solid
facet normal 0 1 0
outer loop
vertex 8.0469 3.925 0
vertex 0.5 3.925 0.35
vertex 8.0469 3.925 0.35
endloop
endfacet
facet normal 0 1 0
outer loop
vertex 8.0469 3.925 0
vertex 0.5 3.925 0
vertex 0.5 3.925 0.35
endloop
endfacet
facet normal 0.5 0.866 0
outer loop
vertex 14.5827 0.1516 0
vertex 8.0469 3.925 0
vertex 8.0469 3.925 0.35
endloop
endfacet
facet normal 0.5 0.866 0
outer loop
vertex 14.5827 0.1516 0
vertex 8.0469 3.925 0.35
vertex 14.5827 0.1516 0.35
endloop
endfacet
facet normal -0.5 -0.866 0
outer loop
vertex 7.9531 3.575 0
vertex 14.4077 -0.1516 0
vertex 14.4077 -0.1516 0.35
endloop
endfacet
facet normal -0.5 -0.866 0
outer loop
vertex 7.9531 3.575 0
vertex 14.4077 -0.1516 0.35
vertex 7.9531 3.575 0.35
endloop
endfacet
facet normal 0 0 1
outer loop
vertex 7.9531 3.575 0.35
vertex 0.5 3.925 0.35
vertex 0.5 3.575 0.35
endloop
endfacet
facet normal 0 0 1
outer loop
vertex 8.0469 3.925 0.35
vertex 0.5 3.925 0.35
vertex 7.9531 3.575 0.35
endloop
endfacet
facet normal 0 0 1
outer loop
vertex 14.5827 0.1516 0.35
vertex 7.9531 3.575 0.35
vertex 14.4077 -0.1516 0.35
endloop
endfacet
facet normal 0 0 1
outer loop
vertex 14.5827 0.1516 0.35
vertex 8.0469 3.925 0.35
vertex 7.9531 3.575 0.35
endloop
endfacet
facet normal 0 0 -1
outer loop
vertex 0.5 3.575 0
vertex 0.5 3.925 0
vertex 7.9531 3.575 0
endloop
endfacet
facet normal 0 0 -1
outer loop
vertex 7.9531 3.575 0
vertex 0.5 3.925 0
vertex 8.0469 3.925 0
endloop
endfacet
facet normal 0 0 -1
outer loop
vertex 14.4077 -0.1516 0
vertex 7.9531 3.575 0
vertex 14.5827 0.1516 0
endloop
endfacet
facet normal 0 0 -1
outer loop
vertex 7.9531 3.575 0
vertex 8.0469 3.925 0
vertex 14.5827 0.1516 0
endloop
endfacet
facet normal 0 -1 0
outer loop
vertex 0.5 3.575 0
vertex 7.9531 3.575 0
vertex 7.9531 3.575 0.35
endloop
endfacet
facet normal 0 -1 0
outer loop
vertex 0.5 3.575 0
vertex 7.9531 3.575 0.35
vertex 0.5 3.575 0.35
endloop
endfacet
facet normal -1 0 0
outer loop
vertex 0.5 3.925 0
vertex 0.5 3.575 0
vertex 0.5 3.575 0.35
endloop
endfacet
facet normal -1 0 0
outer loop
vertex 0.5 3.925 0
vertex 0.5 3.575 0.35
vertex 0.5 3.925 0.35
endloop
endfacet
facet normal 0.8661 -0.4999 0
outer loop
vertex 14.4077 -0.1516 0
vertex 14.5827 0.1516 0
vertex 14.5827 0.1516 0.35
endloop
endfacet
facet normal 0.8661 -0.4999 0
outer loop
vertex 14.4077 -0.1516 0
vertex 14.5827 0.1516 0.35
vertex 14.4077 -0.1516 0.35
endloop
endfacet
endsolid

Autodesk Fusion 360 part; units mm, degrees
sketch "Sketch1" plane through (0, 0, 0) normal (0, 0, 1) x (1, 0, 0)
  line L0 (0.5, 3.925) -> (8.0469, 3.925)
  line L1 (7.9531, 3.575) -> (0.5, 3.575)
  line L2 (0.5, 3.575) -> (0.5, 3.925)
  line L3 (0.5, 3.75) -> (8, 3.75) construction
  line L4 (8, 3.75) -> (14.4952, 0) construction
  line L5 (8.0469, 3.925) -> (14.5827, 0.1516)
  line L6 (14.5827, 0.1516) -> (14.4077, -0.1516)
  line L7 (14.4077, -0.1516) -> (7.9531, 3.575)
  dimension "d1" = 150
  dimension "d2" = 0.35
  dimension "d3" = 0.35
  dimension "d14" = 7.5
  dimension "d15" = 7.5
  dimension "d16" = 3.75
  dimension "d20" = 0.5
extrude "Extrude1" add sketch "Sketch1" along normal blind 0.35
equation "d1 = angle"
equation "d2 = channelwidth"
equation "d3 = d2"
equation "angle = 150 deg"
equation "channelwidth = 0.35 mm"
equation "length = 7.5 mm"
equation "length2 = 7.5 mm"
equation "depth = 0.35 mm"
equation "d11 = depth"
equation "d14 = length2"
equation "d15 = length"
equation "d16 = yoffset"
equation "yoffset = length2 * cos(angle - 90 deg)"
equation "xoffset = 0.5 mm"
equation "d20 = xoffset"
